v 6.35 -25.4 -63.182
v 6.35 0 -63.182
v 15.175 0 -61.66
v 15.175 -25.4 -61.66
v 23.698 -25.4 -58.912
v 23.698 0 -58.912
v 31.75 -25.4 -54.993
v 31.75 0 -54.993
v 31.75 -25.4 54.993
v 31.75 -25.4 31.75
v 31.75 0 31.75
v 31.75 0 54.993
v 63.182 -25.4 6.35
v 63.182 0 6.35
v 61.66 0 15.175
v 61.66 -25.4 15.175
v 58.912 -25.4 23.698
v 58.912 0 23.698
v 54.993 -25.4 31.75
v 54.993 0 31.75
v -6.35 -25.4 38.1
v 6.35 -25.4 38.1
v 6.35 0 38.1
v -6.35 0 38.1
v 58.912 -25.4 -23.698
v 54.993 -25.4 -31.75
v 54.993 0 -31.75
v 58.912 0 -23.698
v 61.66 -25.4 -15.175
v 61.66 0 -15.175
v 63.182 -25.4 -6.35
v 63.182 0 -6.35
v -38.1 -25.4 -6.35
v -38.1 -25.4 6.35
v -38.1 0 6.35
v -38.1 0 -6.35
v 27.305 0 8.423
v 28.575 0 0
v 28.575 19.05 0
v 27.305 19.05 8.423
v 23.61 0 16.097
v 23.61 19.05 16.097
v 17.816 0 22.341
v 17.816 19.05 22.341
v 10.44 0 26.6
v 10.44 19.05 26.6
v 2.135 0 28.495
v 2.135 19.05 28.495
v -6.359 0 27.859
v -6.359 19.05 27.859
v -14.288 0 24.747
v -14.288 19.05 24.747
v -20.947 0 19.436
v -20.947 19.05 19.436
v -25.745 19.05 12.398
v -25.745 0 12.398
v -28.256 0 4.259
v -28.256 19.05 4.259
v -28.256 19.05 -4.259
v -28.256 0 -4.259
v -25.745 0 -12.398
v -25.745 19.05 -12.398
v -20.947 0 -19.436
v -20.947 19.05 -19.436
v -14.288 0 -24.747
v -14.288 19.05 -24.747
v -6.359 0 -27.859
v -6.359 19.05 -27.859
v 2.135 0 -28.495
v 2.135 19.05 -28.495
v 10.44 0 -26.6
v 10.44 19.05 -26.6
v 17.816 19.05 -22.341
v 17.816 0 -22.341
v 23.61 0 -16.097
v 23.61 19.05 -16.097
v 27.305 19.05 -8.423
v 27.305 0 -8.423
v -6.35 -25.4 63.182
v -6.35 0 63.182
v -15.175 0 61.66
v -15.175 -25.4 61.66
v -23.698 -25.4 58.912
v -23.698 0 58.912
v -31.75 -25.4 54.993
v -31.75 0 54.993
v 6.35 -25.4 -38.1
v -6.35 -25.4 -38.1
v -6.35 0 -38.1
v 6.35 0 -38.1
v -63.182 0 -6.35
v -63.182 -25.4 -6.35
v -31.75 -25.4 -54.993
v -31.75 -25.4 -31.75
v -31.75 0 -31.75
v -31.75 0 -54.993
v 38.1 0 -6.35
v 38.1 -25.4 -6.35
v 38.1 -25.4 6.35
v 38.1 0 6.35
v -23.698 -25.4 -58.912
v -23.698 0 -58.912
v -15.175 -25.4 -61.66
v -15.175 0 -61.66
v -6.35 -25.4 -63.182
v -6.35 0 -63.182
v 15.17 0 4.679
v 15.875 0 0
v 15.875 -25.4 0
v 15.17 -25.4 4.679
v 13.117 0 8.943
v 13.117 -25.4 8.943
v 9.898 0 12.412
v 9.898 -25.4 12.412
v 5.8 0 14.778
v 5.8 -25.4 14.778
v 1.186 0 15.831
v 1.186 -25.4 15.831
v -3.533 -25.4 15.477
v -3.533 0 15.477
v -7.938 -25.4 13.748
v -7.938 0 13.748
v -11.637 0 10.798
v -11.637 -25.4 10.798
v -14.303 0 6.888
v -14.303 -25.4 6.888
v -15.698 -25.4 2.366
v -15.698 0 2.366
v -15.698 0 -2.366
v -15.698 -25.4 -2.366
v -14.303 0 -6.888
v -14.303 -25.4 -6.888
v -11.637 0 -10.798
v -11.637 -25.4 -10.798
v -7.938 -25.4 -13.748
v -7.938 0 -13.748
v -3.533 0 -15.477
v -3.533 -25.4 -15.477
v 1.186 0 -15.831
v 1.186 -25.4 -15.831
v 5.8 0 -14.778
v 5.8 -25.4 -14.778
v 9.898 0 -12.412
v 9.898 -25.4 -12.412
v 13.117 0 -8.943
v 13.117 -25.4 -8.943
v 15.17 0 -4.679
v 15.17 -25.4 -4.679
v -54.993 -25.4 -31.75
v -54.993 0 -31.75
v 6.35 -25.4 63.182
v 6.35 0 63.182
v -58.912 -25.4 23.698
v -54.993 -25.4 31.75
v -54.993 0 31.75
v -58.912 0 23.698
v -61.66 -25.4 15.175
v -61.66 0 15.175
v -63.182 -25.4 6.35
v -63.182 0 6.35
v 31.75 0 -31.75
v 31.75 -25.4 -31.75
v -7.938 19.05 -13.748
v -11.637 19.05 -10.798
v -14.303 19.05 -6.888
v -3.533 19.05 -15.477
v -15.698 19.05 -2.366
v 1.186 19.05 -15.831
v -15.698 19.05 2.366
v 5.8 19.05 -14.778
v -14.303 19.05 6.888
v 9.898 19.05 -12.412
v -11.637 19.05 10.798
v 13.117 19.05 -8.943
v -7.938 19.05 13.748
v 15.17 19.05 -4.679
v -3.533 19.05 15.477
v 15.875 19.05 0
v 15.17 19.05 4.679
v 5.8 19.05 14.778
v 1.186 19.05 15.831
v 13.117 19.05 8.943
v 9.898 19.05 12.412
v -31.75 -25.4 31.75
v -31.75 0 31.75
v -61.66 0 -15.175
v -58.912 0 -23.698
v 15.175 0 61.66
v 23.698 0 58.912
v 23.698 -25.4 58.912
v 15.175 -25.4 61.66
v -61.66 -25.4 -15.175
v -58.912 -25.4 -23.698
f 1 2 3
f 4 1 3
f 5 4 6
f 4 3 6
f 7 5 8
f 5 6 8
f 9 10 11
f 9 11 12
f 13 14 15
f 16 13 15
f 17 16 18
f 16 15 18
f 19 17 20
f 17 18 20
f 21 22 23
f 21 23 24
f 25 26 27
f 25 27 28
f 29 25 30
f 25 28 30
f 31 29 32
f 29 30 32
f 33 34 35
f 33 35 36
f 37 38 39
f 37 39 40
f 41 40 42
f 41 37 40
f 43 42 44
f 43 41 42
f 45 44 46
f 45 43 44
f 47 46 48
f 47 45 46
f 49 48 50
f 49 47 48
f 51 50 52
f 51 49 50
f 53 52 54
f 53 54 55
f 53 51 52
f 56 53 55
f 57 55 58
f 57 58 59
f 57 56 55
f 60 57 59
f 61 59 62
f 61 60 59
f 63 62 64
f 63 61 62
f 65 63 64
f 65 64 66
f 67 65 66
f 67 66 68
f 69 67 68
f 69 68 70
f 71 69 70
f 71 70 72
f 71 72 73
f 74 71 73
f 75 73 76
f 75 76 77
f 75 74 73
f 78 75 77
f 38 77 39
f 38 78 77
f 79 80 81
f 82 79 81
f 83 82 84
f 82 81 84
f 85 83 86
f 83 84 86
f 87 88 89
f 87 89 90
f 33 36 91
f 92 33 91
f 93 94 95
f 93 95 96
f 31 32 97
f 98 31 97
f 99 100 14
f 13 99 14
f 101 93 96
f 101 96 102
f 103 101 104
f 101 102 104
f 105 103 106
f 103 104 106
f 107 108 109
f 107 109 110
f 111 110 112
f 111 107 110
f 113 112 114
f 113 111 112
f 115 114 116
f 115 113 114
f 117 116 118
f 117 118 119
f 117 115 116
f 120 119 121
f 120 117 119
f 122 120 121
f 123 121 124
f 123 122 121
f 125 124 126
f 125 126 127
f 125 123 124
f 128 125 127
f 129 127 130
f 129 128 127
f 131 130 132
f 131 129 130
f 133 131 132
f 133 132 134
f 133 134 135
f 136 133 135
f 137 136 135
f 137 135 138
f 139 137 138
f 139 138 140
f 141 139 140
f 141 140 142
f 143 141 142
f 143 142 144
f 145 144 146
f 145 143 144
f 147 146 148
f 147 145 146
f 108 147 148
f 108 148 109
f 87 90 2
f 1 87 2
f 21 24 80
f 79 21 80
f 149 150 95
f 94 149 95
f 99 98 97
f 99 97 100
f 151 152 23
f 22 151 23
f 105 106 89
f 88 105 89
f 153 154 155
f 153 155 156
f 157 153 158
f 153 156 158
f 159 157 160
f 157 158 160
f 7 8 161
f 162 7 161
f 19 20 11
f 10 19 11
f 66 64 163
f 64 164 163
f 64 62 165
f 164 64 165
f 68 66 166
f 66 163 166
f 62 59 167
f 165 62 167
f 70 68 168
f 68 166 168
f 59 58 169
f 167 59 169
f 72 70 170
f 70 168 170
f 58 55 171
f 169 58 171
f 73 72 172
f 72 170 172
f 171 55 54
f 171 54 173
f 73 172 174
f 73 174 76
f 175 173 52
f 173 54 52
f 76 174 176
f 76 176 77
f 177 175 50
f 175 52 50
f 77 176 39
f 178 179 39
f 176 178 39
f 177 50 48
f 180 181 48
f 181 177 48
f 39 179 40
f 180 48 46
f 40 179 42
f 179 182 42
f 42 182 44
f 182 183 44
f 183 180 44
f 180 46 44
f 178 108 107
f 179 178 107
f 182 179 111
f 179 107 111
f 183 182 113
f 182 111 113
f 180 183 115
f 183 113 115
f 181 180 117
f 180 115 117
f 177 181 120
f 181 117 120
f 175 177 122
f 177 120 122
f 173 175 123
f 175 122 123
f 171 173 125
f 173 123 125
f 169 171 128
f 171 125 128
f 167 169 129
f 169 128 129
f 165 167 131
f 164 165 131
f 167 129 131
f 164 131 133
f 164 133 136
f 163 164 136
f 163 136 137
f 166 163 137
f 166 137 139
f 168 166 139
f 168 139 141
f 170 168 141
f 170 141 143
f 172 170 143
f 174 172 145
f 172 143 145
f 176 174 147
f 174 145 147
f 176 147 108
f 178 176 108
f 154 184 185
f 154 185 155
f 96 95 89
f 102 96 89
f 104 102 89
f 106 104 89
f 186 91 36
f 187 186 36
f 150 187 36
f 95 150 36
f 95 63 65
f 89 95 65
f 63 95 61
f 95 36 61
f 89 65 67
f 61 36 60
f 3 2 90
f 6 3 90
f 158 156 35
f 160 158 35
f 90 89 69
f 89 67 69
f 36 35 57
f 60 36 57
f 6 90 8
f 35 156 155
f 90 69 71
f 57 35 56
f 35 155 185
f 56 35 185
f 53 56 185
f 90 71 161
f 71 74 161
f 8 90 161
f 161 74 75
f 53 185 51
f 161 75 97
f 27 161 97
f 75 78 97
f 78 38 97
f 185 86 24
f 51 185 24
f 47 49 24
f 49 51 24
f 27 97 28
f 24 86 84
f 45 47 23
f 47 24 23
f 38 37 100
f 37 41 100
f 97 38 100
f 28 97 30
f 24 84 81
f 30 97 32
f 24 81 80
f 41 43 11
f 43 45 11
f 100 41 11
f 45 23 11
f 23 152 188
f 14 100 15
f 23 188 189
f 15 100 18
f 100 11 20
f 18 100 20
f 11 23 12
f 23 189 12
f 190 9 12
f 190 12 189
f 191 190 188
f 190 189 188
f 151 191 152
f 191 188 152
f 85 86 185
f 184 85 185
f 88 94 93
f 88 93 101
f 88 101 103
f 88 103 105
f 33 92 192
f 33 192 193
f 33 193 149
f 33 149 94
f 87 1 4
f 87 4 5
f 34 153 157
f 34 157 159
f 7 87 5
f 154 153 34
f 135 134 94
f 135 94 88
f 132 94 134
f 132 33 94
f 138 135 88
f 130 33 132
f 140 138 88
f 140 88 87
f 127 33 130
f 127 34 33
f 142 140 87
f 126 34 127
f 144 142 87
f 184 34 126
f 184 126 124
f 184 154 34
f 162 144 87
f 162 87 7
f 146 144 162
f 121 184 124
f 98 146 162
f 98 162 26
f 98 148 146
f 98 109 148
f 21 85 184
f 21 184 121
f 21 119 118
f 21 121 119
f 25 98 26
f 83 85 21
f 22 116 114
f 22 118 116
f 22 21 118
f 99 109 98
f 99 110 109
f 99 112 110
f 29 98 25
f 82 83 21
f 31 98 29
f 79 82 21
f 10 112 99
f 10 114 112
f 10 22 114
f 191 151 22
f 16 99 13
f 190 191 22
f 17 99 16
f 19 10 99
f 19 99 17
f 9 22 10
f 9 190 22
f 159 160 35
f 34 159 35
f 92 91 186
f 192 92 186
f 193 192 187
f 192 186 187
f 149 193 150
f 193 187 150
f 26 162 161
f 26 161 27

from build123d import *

# Parameters (mm, degrees)
F0_R     = 28.575
F0_R_2   = 15.875
F1_DEPTH = 25.4
F2_DEPTH = 19.05


with BuildPart() as f1:
    # F0 (on Front) → F1 (new body)
    with BuildSketch(Plane.XZ):
        with BuildLine():
            Line((38.1, 6.35), (63.181702, 6.35))
            ThreePointArc((63.181702, 6.35), (60.436597, 19.485066), (54.992613, 31.75))
            Line((54.992613, 31.75), (31.75, 31.75))
            Line((31.75, 31.75), (31.75, 54.992613))
            ThreePointArc((31.75, 54.992613), (19.485066, 60.436597), (6.35, 63.181702))
            Line((6.35, 63.181702), (6.35, 38.1))
            Line((6.35, 38.1), (0, 38.1))
            Line((0, 38.1), (-6.35, 38.1))
            Line((-6.35, 38.1), (-6.35, 63.181702))
            ThreePointArc((-6.35, 63.181702), (-19.485066, 60.436597), (-31.75, 54.992613))
            Line((-31.75, 54.992613), (-31.75, 31.75))
            Line((-31.75, 31.75), (-54.992613, 31.75))
            ThreePointArc((-54.992613, 31.75), (-60.436597, 19.485066), (-63.181702, 6.35))
            Line((-63.181702, 6.35), (-38.1, 6.35))
            Line((-38.1, 6.35), (-38.1, 0))
            Line((-38.1, 0), (-38.1, -6.35))
            Line((-38.1, -6.35), (-63.181702, -6.35))
            ThreePointArc((-63.181702, -6.35), (-60.436597, -19.485066), (-54.992613, -31.75))
            Line((-54.992613, -31.75), (-31.75, -31.75))
            Line((-31.75, -31.75), (-31.75, -54.992613))
            ThreePointArc((-31.75, -54.992613), (-19.485066, -60.436597), (-6.35, -63.181702))
            Line((-6.35, -63.181702), (-6.35, -38.1))
            Line((-6.35, -38.1), (0, -38.1))
            Line((0, -38.1), (6.35, -38.1))
            Line((6.35, -38.1), (6.35, -63.181702))
            ThreePointArc((6.35, -63.181702), (19.485066, -60.436597), (31.75, -54.992613))
            Line((31.75, -54.992613), (31.75, -31.75))
            Line((31.75, -31.75), (54.992613, -31.75))
            ThreePointArc((54.992613, -31.75), (60.436597, -19.485066), (63.181702, -6.35))
            Line((63.181702, -6.35), (38.1, -6.35))
            Line((38.1, -6.35), (38.1, 0))
            Line((38.1, 0), (38.1, 6.35))
        make_face()
        Circle(F0_R, mode=Mode.SUBTRACT)
        Circle(F0_R)
        Circle(F0_R_2, mode=Mode.SUBTRACT)
    extrude(amount=F1_DEPTH)

    # F0 (on Front) → F2 (join)
    with BuildSketch(Plane.XZ):
        Circle(F0_R)
        Circle(F0_R_2, mode=Mode.SUBTRACT)
    extrude(amount=-F2_DEPTH)


solid = f1.part
